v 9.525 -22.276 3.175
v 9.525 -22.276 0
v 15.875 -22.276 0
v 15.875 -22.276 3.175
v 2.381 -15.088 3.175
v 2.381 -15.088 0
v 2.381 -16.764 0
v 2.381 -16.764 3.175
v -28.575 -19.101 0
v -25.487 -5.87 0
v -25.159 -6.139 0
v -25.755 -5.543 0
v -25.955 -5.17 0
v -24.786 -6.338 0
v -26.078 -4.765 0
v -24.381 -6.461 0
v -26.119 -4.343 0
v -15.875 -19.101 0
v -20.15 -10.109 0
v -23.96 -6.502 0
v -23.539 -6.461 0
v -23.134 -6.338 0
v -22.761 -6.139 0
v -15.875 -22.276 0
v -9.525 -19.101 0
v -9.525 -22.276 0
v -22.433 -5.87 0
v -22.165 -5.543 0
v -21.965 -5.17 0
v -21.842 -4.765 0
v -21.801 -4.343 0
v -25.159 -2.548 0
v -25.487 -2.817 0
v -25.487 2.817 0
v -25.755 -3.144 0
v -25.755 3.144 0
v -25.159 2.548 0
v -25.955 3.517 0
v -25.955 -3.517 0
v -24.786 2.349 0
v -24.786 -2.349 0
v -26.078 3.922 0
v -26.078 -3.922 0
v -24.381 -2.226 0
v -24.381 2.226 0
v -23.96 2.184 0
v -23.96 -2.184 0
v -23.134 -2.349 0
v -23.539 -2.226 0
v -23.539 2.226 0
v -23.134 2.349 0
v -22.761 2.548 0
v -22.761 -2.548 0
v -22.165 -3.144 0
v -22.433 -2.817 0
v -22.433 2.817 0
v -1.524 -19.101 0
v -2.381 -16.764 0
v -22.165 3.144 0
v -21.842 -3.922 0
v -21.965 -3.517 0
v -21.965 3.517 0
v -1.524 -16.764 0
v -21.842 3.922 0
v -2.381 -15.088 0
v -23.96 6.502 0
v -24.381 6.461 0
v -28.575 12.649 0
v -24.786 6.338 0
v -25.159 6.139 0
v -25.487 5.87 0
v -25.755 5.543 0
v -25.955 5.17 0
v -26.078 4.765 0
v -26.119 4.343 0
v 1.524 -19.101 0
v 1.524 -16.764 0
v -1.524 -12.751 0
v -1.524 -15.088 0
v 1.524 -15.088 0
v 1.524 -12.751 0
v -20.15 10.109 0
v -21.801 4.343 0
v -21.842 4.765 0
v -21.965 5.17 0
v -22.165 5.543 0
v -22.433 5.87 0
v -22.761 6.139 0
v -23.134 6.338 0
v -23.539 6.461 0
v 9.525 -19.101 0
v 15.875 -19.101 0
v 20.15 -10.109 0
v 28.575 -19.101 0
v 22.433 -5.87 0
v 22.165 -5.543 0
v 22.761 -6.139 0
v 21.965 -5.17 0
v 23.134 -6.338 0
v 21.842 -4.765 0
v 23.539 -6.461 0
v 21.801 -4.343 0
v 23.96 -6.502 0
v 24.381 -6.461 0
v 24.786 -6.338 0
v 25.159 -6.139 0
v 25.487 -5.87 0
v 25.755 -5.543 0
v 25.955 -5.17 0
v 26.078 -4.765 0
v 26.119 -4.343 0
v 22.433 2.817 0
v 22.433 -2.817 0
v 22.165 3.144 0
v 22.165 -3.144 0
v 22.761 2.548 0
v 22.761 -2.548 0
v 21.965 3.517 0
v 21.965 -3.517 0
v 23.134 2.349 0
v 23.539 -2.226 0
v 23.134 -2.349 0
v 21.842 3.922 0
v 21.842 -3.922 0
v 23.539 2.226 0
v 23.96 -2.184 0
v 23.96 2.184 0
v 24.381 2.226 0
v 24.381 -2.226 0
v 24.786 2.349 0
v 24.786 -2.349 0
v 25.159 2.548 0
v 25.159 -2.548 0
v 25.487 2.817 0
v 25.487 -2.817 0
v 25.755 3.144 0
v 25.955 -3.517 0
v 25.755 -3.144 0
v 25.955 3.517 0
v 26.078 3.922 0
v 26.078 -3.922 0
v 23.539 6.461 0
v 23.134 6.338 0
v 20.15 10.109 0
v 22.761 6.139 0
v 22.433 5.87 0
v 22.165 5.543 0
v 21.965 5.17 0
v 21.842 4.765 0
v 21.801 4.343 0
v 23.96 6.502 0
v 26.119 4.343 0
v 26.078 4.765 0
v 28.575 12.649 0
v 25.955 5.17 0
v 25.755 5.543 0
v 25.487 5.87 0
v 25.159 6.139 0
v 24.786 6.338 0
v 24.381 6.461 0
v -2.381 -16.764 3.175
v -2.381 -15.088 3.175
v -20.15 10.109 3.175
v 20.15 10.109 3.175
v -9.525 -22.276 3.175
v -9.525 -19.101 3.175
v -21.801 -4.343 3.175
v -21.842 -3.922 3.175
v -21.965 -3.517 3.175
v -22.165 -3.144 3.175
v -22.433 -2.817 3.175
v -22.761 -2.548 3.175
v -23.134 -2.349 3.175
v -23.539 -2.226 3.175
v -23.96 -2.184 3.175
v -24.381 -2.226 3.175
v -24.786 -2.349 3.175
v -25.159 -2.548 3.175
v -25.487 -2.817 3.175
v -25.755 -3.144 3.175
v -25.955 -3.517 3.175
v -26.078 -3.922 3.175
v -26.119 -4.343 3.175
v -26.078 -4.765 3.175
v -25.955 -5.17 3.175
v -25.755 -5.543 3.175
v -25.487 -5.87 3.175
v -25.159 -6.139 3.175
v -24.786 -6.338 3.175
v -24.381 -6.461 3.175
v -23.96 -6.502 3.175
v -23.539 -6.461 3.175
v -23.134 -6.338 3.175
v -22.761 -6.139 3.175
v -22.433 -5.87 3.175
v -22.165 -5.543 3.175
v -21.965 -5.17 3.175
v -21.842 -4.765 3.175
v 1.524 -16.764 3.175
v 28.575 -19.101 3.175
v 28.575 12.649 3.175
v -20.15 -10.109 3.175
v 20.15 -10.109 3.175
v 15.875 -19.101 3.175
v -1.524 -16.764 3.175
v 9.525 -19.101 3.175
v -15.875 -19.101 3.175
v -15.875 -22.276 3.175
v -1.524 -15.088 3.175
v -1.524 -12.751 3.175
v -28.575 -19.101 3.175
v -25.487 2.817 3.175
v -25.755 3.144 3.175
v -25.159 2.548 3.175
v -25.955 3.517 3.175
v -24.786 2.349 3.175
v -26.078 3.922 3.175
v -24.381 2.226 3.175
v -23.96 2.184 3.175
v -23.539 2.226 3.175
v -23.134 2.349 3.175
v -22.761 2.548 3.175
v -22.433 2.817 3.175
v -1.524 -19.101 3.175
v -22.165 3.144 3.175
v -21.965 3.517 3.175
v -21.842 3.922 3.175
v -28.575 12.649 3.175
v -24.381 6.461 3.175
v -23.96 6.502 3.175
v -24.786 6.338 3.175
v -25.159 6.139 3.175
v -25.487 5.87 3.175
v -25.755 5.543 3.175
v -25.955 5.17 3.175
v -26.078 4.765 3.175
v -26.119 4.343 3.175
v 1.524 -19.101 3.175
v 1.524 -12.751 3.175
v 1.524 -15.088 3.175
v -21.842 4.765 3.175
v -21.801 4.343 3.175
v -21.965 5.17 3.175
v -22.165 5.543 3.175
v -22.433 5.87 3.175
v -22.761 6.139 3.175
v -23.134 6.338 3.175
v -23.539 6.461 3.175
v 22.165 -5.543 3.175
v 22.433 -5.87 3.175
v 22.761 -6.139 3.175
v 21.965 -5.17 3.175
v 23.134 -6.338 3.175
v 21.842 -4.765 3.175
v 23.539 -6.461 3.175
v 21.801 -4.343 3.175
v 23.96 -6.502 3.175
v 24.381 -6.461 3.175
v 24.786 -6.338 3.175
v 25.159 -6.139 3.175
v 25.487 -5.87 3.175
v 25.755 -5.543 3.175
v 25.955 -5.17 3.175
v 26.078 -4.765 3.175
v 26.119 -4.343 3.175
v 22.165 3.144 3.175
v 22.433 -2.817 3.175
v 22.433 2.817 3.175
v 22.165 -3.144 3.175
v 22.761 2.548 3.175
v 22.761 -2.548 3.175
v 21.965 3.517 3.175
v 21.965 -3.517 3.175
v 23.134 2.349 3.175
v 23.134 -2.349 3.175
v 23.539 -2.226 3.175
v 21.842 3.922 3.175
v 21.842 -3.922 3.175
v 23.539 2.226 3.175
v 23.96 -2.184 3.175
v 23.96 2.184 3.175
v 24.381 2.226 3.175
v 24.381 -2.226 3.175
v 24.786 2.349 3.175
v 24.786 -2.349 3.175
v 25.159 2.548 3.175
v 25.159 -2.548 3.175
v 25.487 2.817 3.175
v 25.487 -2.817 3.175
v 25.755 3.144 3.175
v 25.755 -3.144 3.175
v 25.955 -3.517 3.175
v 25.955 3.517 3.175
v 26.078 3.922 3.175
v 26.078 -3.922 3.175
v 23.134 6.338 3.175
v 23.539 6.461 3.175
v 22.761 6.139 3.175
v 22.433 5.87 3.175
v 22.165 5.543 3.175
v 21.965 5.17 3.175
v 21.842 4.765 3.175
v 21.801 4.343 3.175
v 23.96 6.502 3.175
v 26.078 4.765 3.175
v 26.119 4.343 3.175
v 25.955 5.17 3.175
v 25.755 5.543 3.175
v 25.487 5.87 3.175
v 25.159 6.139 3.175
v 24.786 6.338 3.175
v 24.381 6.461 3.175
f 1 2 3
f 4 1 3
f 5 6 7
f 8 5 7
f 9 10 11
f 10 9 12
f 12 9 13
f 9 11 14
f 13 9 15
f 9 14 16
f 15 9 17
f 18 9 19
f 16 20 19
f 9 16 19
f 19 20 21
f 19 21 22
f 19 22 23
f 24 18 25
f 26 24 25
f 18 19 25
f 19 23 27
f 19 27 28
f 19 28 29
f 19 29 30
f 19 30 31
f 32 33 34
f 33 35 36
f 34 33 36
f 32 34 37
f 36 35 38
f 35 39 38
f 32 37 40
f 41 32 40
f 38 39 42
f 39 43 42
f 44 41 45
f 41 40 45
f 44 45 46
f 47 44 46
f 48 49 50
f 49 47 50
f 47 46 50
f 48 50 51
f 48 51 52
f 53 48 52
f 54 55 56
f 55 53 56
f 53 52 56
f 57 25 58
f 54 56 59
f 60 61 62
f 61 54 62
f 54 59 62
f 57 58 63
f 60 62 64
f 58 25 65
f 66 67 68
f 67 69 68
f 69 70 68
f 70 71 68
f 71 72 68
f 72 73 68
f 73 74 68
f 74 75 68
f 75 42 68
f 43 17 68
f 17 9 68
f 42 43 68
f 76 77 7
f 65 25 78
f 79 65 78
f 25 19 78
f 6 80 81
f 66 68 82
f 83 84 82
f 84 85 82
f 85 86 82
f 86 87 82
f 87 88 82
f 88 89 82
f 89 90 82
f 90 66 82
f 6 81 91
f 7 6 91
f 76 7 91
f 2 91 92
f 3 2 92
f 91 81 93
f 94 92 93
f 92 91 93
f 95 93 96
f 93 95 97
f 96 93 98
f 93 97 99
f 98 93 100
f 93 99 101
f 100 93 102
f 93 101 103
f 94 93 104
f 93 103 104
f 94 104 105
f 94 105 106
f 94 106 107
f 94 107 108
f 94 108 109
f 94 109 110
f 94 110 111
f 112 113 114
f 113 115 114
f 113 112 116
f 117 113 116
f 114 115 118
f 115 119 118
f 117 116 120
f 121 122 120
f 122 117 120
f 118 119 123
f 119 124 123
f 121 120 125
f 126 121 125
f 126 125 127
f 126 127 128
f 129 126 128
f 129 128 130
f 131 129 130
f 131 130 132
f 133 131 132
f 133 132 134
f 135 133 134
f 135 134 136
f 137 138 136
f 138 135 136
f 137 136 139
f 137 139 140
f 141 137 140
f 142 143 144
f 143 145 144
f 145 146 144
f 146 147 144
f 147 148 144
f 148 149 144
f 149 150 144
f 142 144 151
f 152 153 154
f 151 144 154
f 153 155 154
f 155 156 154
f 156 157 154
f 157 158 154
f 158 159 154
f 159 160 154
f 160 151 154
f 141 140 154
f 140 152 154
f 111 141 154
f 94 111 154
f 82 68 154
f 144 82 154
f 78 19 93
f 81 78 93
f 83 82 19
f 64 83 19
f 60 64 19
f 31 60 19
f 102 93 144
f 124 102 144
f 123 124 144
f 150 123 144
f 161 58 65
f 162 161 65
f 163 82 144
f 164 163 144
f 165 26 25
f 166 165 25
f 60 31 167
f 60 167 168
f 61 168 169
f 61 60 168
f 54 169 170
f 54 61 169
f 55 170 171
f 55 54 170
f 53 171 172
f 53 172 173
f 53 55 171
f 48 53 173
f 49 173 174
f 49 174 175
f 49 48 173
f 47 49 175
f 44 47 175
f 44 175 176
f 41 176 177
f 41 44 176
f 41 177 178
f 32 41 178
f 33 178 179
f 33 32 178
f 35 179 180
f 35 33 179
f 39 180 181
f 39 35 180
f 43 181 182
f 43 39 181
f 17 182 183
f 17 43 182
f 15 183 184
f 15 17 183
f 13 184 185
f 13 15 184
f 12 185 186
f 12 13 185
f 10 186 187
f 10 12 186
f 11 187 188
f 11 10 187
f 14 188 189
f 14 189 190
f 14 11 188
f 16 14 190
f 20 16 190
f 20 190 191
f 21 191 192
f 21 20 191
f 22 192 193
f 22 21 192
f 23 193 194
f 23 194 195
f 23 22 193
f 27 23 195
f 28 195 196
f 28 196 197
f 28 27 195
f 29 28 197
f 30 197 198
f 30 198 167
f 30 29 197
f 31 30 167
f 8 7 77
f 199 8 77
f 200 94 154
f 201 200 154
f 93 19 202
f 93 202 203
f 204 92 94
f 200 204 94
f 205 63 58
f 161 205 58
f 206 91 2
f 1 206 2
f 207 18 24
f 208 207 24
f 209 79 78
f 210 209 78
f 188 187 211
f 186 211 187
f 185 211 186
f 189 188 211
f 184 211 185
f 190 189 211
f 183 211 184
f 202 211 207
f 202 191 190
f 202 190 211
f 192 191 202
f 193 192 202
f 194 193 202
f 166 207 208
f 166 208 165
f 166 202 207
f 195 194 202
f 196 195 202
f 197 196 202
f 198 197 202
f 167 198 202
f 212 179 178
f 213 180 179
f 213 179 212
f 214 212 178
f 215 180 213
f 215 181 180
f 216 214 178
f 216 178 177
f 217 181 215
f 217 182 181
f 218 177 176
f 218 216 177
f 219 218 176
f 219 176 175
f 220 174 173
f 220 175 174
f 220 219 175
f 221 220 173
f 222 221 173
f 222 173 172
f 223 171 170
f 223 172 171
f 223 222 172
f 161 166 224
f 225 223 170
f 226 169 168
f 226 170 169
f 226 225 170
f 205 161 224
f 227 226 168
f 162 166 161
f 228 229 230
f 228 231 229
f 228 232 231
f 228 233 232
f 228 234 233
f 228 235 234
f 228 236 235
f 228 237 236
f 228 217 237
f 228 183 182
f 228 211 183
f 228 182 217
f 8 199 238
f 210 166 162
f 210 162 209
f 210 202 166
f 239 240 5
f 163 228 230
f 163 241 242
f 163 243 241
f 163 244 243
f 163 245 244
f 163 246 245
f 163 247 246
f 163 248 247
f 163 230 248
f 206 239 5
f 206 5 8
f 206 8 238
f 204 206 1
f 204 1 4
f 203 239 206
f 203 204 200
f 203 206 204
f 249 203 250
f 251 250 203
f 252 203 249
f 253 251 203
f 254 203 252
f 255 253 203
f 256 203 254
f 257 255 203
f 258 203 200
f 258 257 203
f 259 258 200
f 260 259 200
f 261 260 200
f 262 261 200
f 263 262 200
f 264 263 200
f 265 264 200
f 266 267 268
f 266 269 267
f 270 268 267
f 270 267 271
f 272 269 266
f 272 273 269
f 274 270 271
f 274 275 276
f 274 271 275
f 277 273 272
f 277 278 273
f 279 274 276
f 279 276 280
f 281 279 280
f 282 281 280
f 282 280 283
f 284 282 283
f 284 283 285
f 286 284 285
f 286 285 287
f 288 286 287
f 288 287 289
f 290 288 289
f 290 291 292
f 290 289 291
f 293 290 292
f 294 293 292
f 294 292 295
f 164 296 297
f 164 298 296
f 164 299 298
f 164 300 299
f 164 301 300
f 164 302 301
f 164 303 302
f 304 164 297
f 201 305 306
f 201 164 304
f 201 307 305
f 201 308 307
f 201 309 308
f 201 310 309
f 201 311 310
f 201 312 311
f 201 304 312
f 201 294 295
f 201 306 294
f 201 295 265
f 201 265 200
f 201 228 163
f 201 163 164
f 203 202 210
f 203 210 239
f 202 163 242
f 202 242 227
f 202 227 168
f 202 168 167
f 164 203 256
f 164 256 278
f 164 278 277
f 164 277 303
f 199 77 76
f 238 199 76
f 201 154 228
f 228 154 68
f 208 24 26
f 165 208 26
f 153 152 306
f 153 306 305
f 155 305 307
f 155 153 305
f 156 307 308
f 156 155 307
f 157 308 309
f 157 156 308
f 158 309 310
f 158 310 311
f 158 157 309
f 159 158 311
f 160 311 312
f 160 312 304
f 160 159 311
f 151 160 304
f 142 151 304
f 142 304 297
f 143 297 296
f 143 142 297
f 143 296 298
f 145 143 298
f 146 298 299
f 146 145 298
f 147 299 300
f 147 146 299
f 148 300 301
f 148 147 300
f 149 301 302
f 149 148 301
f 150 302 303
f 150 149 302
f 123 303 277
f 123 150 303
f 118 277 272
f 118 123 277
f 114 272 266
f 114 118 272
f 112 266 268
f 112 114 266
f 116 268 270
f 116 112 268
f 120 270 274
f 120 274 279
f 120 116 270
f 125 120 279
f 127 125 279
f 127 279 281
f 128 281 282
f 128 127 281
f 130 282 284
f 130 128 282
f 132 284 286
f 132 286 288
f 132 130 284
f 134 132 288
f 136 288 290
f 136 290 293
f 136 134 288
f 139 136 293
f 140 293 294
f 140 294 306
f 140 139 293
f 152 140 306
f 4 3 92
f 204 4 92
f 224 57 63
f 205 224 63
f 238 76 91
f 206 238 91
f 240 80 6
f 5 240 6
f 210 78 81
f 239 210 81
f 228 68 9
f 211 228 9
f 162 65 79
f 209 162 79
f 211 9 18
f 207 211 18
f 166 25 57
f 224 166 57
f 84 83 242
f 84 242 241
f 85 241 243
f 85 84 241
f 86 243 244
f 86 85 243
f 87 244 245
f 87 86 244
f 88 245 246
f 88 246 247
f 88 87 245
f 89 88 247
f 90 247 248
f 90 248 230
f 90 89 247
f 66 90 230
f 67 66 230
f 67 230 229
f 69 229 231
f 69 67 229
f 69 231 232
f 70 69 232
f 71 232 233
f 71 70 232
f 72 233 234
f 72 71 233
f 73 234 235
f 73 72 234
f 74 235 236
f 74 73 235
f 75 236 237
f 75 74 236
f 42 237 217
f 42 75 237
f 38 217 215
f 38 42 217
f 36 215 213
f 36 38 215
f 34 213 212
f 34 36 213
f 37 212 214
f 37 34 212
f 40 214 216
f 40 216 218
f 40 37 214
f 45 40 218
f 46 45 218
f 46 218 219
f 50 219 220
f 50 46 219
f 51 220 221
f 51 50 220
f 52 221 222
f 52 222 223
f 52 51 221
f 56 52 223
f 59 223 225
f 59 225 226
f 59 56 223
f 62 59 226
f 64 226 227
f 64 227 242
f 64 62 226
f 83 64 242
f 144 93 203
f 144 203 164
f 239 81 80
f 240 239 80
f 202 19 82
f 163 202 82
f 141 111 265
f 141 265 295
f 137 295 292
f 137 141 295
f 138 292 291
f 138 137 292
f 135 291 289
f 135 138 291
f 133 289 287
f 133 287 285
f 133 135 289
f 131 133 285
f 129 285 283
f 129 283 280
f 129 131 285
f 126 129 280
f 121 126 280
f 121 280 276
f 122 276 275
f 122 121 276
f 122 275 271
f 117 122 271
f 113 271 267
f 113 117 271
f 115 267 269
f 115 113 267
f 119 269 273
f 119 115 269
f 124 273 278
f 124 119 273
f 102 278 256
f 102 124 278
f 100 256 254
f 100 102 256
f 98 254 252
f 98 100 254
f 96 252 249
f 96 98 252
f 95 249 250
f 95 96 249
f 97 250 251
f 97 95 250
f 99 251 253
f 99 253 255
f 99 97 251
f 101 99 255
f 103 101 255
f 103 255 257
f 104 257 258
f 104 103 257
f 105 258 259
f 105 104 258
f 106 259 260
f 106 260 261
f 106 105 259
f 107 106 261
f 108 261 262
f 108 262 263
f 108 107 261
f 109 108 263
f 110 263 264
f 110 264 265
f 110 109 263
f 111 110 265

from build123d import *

# Parameters (mm, degrees)
F0_R     = 2.159
F0_W     = 40.3
F0_H     = 20.2184
F1_DEPTH = 3.175


# Not quite as in the source:
# - a length typed as a fraction of an inch, garbled in the dataset ("3 / 203.2 mm" for 3/8 in), is restored


with BuildPart() as f1:
    # F0 (on Top) → F1 (new body)
    with BuildSketch(Plane.XY):
        Polygon((28.575, -19.1008), (28.575, 12.6492), (-28.575, 12.6492), (-28.575, -19.1008), (-15.875, -19.1008), (-15.875, -22.2758), (-9.525, -22.2758), (-9.525, -19.1008), (-1.524, -19.1008), (-1.524, -16.764), (-2.38125, -16.764), (-2.38125, -15.0876), (-1.524, -15.0876), (-1.524, -12.7508), (1.524, -12.7508), (1.524, -15.0876), (2.38125, -15.0876), (2.38125, -16.764), (1.524, -16.764), (1.524, -19.1008), (9.525, -19.1008), (9.525, -22.2758), (15.875, -22.2758), (15.875, -19.1008), align=None)
        with Locations((-23.96, -4.3434)):
            Circle(F0_R, mode=Mode.SUBTRACT)
        with Locations((-23.96, 4.3434)):
            Circle(F0_R, mode=Mode.SUBTRACT)
        Rectangle(F0_W, F0_H, mode=Mode.SUBTRACT)
        with Locations((23.96, -4.3434)):
            Circle(F0_R, mode=Mode.SUBTRACT)
        with Locations((23.96, 4.3434)):
            Circle(F0_R, mode=Mode.SUBTRACT)
    extrude(amount=F1_DEPTH)


solid = f1.part
